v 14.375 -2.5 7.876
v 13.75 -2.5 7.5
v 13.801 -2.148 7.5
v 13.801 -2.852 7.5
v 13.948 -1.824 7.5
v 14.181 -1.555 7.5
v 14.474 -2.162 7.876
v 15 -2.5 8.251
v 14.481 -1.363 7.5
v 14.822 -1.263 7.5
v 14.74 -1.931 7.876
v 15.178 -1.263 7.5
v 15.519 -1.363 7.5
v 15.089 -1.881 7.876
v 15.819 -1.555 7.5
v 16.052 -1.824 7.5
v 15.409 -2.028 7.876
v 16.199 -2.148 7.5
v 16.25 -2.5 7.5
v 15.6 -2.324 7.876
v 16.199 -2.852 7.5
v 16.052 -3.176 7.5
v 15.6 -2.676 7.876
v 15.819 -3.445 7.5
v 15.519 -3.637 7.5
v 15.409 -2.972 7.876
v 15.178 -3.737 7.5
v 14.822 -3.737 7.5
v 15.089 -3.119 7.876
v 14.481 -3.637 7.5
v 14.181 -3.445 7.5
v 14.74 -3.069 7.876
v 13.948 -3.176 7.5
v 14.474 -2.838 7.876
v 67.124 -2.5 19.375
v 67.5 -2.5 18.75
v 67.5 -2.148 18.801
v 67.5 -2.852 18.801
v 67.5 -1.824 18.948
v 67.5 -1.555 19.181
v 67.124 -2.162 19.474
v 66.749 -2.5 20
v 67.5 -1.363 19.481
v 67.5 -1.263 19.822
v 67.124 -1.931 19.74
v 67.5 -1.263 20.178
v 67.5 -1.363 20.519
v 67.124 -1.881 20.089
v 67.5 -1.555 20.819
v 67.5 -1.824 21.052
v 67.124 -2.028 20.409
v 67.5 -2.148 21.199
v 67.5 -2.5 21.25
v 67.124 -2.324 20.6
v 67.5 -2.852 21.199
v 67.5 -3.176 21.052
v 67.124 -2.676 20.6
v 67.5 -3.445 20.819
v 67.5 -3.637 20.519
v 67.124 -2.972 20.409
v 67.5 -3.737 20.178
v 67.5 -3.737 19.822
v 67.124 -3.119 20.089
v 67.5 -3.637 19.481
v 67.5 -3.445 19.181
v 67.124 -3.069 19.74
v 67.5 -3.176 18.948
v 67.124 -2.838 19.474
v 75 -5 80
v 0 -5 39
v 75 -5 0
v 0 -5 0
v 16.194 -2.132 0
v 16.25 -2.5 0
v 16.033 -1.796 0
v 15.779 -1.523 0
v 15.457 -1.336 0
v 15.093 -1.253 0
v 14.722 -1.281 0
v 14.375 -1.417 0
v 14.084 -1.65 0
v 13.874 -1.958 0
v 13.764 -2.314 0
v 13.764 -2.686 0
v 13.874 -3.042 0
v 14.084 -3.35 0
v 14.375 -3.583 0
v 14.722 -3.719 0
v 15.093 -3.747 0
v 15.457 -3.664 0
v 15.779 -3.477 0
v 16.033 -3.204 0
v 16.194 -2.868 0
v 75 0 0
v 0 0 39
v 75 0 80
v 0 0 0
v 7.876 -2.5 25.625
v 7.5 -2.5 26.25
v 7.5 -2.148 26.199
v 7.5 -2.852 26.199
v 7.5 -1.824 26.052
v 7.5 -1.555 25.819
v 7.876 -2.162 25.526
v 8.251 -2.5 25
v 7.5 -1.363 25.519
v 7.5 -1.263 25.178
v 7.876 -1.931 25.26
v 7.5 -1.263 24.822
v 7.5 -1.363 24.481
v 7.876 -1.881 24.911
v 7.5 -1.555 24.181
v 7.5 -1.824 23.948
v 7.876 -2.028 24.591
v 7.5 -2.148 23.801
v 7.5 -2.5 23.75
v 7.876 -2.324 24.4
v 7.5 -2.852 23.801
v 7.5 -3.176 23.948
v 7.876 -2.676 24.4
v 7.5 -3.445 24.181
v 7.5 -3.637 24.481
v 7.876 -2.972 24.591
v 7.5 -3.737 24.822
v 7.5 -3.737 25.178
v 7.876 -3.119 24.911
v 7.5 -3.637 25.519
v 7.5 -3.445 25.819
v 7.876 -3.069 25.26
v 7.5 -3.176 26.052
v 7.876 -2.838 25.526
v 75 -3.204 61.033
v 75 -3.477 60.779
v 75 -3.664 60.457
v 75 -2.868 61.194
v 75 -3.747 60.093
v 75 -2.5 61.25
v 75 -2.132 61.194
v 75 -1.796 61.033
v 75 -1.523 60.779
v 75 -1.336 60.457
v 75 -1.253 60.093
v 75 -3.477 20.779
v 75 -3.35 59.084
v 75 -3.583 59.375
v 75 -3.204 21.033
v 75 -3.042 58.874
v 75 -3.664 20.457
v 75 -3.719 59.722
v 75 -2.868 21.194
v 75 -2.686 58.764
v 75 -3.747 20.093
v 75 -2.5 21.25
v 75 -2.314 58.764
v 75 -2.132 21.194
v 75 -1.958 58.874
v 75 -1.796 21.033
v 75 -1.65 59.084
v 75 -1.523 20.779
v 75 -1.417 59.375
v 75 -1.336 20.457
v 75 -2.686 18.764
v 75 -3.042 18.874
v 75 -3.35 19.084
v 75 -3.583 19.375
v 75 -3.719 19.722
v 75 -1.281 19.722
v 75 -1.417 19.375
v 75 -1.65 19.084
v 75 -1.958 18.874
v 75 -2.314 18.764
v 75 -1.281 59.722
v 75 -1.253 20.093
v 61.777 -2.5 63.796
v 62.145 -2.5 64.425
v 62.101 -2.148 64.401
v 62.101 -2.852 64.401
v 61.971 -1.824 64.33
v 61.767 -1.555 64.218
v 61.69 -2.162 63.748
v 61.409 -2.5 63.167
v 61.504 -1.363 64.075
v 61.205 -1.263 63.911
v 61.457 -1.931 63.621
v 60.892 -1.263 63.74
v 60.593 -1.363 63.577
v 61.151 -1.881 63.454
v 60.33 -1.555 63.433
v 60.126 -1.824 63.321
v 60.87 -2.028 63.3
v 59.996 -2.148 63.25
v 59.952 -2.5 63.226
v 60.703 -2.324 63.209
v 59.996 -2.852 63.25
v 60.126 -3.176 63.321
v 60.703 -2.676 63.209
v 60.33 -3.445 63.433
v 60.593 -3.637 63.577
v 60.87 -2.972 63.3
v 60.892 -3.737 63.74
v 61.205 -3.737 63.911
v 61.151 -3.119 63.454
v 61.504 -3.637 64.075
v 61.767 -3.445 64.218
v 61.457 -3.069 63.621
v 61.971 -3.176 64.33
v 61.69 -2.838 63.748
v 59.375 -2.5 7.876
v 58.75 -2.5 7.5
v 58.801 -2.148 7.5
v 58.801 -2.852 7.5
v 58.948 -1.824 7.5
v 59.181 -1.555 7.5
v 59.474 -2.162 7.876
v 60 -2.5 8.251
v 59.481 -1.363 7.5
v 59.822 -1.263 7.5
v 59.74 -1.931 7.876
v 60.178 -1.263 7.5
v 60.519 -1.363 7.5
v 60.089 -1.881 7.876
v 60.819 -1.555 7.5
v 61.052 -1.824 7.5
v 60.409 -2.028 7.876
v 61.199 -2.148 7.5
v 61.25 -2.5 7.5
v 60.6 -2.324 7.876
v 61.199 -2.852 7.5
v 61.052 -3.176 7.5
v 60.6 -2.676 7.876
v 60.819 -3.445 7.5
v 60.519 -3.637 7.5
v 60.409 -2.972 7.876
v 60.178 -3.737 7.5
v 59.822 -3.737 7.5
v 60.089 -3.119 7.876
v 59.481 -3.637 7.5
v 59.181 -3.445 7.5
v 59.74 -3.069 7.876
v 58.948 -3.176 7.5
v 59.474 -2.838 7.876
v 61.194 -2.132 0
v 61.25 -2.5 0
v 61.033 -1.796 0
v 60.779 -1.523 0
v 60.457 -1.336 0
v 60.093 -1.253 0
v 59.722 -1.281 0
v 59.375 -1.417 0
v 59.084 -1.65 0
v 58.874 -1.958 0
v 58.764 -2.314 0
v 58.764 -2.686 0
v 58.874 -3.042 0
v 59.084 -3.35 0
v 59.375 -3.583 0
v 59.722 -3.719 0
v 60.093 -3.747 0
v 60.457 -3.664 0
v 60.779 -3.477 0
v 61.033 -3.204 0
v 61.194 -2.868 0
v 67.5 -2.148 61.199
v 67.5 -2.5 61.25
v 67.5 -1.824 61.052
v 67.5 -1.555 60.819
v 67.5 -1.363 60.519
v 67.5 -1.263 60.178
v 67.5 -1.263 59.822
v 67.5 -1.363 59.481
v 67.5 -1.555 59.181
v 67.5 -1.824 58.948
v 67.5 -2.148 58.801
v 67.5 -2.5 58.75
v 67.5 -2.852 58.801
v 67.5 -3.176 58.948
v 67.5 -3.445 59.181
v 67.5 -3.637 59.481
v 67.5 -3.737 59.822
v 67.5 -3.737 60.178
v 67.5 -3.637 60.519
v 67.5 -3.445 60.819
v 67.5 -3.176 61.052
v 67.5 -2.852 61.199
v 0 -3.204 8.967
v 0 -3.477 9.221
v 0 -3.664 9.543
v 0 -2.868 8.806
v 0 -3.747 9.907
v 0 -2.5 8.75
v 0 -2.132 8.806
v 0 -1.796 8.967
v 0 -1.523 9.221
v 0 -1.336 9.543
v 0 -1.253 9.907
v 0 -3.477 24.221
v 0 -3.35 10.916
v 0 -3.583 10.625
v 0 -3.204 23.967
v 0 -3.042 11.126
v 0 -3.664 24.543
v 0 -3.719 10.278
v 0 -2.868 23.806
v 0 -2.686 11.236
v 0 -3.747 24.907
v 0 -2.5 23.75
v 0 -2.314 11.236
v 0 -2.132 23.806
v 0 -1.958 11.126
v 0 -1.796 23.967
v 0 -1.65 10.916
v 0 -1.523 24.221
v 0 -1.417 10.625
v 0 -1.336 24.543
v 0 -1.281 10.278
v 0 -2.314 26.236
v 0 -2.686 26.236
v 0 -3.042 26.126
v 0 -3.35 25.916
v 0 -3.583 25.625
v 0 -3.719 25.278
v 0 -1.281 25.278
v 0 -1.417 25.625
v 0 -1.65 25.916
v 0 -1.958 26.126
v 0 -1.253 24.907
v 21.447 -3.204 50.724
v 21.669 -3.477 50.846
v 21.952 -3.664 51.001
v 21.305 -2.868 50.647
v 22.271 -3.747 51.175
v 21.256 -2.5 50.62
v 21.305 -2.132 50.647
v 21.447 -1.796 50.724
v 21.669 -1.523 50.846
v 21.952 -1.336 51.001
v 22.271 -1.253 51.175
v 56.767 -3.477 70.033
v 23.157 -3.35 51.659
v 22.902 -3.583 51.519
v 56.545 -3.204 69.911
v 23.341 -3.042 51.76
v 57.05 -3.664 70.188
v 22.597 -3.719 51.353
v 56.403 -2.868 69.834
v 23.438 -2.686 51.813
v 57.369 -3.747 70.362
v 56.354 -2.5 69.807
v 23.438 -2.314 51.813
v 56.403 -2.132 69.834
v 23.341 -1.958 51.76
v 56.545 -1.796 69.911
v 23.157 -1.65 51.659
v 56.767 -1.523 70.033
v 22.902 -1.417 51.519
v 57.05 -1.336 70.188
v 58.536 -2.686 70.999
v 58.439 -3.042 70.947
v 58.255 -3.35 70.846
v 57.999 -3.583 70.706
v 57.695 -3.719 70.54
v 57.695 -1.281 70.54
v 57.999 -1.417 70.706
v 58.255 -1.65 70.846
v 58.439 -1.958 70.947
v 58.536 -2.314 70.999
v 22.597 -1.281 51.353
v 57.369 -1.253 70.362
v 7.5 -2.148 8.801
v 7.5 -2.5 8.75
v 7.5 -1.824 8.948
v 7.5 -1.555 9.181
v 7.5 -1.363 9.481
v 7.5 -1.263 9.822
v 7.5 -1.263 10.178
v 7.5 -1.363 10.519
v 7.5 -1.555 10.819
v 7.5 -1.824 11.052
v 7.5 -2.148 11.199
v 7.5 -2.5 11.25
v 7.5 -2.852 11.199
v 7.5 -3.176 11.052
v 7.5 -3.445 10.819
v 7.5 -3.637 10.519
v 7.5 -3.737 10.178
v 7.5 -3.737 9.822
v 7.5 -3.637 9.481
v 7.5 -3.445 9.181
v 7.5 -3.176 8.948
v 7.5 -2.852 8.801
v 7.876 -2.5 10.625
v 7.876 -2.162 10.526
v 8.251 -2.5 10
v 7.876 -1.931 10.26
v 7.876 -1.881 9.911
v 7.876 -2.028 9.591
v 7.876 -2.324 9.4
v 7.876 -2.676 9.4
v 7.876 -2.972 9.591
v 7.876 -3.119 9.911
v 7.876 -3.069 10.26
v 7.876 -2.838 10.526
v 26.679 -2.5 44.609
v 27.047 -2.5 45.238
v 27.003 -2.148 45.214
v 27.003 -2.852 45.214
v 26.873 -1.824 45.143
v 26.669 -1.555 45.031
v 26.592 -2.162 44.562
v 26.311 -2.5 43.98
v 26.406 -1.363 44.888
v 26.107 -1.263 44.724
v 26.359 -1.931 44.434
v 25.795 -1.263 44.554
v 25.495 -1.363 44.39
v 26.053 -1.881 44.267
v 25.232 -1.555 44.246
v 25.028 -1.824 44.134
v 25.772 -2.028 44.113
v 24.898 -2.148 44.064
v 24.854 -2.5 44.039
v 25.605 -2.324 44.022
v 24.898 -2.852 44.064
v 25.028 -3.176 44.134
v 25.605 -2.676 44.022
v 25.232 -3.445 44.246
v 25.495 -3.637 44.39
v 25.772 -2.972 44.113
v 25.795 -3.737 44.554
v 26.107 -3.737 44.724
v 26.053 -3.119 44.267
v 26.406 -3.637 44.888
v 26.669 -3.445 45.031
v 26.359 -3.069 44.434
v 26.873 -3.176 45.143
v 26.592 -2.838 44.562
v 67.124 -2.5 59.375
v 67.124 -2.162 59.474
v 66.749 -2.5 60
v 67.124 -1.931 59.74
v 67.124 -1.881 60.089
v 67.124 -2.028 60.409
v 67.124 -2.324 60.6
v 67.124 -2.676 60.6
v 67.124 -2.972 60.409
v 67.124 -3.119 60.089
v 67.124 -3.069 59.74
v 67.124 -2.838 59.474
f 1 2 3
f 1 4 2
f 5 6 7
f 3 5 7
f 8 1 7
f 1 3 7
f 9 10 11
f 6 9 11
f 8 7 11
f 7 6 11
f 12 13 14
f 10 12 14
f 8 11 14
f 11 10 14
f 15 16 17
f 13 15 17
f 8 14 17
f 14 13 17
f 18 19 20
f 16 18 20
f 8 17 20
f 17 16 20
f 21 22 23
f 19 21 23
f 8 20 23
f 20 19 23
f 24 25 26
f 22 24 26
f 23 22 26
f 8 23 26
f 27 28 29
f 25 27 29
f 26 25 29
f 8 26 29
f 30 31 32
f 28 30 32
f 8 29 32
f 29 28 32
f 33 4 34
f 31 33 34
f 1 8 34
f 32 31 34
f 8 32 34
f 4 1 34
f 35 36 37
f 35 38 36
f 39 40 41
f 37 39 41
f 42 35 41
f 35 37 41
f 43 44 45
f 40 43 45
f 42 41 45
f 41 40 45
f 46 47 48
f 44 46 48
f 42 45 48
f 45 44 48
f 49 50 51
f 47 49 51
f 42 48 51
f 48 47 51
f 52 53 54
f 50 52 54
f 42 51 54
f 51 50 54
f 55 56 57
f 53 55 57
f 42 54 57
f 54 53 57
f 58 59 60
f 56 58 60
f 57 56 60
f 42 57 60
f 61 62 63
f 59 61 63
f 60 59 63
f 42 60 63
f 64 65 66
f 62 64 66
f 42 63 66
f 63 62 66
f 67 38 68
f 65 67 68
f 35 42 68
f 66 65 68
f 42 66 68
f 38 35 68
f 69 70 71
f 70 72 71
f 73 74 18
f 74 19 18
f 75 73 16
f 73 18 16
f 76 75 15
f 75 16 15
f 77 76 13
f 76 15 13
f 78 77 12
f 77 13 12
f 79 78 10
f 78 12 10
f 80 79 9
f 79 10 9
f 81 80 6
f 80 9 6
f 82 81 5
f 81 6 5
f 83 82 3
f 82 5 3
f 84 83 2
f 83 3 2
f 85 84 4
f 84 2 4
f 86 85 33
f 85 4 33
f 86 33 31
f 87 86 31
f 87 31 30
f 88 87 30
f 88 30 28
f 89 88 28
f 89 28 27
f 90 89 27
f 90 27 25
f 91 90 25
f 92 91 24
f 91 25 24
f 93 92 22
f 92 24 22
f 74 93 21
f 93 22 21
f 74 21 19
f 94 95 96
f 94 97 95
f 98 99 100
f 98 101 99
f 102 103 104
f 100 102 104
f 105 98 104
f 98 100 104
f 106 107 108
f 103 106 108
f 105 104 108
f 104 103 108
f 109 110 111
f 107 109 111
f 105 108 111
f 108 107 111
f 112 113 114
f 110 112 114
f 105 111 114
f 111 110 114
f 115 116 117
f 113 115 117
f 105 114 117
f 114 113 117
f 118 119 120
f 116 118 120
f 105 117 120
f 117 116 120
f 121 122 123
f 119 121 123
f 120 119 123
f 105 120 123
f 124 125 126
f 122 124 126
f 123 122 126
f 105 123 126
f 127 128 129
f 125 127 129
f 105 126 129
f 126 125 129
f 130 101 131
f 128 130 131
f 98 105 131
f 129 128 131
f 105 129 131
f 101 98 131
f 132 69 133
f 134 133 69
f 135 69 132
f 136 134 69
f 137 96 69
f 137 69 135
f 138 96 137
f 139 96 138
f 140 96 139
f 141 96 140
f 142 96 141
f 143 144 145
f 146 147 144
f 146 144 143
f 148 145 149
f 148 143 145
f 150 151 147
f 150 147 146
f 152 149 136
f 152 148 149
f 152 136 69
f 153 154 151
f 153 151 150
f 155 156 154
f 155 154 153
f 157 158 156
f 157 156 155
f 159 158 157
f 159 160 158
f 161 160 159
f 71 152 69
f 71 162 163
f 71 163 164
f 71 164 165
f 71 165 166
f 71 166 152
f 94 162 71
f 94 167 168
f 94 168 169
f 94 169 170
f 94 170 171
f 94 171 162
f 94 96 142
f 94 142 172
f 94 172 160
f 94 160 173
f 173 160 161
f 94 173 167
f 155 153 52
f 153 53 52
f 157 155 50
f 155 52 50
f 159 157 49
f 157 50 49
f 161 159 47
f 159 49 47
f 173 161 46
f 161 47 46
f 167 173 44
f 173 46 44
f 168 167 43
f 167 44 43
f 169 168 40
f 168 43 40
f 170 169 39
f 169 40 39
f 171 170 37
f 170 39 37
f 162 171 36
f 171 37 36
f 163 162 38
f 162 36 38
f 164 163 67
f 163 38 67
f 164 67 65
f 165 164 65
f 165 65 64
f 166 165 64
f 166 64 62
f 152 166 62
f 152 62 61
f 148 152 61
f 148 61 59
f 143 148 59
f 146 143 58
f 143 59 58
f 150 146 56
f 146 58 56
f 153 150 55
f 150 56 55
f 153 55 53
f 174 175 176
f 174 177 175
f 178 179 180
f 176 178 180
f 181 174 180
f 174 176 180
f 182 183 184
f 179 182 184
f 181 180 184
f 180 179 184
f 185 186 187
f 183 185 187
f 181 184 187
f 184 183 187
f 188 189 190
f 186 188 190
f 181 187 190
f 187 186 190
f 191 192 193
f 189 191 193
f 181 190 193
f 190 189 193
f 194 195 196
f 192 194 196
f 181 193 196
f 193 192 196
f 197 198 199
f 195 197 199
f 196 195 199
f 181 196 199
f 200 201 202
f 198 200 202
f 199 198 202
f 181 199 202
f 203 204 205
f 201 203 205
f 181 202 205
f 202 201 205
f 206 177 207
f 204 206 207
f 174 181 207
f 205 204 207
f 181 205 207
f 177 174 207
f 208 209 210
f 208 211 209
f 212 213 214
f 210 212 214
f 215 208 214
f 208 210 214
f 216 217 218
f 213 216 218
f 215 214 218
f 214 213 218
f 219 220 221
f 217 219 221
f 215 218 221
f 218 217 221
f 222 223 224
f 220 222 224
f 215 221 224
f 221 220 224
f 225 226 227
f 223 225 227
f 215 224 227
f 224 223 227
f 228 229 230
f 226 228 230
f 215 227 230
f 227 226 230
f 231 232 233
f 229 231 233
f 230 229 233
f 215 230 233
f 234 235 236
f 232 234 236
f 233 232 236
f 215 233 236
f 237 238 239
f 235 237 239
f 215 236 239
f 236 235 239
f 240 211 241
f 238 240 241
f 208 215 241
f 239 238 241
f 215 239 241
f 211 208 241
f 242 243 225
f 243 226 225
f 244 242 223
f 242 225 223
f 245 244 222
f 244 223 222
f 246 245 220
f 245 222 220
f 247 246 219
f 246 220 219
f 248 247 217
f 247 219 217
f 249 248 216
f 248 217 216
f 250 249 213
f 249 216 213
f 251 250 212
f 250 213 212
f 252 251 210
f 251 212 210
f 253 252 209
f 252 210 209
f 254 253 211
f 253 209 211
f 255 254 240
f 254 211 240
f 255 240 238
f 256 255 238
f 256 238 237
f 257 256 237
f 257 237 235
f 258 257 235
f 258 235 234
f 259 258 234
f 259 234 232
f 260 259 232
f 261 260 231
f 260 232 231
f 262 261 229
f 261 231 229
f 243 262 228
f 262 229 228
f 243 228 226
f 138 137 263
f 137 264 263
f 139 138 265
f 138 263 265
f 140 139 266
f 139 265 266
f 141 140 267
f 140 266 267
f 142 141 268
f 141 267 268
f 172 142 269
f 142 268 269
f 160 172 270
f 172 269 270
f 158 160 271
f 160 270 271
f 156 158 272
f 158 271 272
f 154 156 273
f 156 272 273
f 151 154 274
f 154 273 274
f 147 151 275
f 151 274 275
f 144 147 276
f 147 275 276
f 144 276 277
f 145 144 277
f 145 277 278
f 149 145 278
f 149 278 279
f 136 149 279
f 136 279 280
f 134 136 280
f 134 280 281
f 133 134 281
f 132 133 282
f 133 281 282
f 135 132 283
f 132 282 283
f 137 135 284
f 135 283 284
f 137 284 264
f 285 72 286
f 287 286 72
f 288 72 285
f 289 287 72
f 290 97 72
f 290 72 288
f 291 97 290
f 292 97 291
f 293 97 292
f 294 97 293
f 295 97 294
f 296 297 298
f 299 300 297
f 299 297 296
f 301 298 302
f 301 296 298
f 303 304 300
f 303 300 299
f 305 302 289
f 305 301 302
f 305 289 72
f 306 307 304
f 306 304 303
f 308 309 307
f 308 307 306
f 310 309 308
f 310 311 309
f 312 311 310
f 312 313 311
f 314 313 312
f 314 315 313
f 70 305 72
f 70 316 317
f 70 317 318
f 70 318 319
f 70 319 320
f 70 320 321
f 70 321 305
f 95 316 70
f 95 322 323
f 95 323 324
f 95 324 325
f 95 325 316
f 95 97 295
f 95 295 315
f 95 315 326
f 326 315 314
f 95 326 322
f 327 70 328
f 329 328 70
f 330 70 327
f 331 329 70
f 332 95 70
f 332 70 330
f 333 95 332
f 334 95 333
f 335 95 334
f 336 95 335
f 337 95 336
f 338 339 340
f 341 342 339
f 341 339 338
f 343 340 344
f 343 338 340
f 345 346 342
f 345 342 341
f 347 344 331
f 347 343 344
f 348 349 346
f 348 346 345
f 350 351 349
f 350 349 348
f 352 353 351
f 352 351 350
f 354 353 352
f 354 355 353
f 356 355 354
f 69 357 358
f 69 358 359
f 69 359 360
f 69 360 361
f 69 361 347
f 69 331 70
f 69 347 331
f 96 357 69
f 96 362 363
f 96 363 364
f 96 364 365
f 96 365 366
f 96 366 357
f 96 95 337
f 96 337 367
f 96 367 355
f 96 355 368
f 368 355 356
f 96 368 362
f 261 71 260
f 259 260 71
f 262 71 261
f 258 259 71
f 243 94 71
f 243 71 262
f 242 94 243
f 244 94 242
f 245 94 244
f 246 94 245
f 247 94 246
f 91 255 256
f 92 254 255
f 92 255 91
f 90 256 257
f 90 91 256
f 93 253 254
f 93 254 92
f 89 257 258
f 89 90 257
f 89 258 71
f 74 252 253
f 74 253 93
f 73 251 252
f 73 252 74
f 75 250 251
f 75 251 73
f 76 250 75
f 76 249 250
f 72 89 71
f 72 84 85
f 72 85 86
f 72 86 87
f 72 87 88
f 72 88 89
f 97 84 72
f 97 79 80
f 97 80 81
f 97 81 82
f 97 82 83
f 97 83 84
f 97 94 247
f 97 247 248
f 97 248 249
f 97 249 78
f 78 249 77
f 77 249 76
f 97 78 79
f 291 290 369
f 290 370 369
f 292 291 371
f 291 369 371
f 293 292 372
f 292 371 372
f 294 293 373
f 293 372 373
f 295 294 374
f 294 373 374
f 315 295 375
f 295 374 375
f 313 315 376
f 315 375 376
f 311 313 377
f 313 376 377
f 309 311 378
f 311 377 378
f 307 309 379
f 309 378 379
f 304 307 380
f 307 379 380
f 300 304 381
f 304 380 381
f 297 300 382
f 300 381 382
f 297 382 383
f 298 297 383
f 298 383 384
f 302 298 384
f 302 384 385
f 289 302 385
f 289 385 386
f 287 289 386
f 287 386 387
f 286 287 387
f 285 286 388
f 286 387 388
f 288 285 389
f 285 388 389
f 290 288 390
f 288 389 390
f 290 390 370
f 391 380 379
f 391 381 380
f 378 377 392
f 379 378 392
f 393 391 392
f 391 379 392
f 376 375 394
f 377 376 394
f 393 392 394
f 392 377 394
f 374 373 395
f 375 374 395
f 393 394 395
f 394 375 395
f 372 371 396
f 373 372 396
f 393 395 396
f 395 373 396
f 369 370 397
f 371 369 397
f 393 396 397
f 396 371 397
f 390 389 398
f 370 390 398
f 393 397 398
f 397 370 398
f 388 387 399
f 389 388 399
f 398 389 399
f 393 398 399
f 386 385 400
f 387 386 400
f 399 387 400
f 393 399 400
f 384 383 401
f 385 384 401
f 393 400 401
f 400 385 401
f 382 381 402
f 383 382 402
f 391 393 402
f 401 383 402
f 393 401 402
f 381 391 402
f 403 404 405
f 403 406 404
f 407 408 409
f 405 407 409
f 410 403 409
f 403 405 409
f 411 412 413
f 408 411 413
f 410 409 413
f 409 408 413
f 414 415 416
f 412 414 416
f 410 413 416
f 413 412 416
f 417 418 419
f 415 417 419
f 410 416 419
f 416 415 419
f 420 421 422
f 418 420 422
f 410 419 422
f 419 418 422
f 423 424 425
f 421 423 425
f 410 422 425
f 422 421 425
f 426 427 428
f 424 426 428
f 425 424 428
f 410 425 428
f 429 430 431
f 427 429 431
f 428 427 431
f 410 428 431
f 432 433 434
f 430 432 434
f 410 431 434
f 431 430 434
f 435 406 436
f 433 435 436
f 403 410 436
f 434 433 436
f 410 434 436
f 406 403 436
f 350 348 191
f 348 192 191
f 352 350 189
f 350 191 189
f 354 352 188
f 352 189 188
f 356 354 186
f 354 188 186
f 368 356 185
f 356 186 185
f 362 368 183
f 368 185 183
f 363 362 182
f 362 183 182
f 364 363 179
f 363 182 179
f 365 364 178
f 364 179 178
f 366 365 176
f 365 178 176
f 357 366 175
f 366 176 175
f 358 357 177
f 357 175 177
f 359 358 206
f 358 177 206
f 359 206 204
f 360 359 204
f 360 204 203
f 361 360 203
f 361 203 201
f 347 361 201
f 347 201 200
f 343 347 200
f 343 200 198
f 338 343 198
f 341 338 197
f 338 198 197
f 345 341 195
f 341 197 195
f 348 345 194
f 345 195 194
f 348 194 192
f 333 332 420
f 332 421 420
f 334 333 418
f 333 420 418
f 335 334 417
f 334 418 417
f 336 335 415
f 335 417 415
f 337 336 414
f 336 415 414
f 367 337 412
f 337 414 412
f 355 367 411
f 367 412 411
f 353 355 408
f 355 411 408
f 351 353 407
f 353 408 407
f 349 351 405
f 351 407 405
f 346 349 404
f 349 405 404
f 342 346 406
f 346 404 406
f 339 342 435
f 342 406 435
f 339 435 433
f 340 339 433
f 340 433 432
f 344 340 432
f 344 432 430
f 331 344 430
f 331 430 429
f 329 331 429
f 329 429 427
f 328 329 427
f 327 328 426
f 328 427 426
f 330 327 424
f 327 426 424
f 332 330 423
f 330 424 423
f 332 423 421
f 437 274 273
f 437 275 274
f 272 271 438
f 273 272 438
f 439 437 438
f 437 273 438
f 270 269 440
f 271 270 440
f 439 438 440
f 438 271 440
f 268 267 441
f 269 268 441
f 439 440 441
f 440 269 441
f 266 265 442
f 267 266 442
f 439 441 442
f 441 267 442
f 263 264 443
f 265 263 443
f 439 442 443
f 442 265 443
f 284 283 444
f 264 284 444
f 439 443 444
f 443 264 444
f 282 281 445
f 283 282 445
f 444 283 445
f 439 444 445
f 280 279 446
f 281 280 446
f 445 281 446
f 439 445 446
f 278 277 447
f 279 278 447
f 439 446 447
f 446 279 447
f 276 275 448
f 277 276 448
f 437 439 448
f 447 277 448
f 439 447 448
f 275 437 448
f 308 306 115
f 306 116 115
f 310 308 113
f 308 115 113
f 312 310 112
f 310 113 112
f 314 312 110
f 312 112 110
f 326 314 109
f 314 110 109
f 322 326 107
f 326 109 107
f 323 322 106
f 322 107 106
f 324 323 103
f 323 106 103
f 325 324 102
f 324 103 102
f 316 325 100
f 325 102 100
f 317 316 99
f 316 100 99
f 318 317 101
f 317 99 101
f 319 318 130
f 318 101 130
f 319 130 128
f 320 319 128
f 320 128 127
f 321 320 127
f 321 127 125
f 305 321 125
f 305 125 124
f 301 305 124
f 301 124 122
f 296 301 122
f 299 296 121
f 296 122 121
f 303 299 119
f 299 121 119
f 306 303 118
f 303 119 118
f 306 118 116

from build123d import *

# Parameters (mm, degrees)
BOSS_EXTRUDE1_DEPTH       = 5
M3X0_5_TAPPED_HOLE1_D     = 2.5
M3X0_5_TAPPED_HOLE1_DEPTH = 7.5
M3X0_5_TAPPED_HOLE1_TIP   = 0.751075774
M3X0_5_TAPPED_HOLE2_D     = 2.5
M3X0_5_TAPPED_HOLE2_DEPTH = 7.5
M3X0_5_TAPPED_HOLE2_TIP   = 0.751075774
M3X0_5_TAPPED_HOLE3_D     = 2.5
M3X0_5_TAPPED_HOLE3_DEPTH = 7.5
M3X0_5_TAPPED_HOLE3_TIP   = 0.751075774
M3X0_5_TAPPED_HOLE4_D     = 2.5
M3X0_5_TAPPED_HOLE4_DEPTH = 7.5
M3X0_5_TAPPED_HOLE4_TIP   = 0.751075774


with BuildPart() as part:
    # Sketch1 → Boss-Extrude1 (new body)
    with BuildSketch(Plane(origin=(0, 0, 0), x_dir=(1, 0, 0), z_dir=(0, 1, 0))):
        Polygon((0, -39), (75, -80), (75, 0), (0, 0), align=None)
    extrude(amount=-BOSS_EXTRUDE1_DEPTH)

    # M3x0.5 Tapped Hole1
    with Locations(Plane(origin=(0, 0, 0), x_dir=(-1, 0, 0), z_dir=(0, 0, -1))):
        with Locations((-15, -2.5), (-60, -2.5)):
            Hole(M3X0_5_TAPPED_HOLE1_D / 2, depth=M3X0_5_TAPPED_HOLE1_DEPTH)
            with Locations((0, 0, -(M3X0_5_TAPPED_HOLE1_DEPTH + M3X0_5_TAPPED_HOLE1_TIP / 2))):  # 118° drill point
                Cone(0, M3X0_5_TAPPED_HOLE1_D / 2, M3X0_5_TAPPED_HOLE1_TIP, mode=Mode.SUBTRACT)

    # M3x0.5 Tapped Hole2
    with Locations(Plane.ZY):
        with Locations((10, -2.5), (25, -2.5)):
            Hole(M3X0_5_TAPPED_HOLE2_D / 2, depth=M3X0_5_TAPPED_HOLE2_DEPTH)
            with Locations((0, 0, -(M3X0_5_TAPPED_HOLE2_DEPTH + M3X0_5_TAPPED_HOLE2_TIP / 2))):  # 118° drill point
                Cone(0, M3X0_5_TAPPED_HOLE2_D / 2, M3X0_5_TAPPED_HOLE2_TIP, mode=Mode.SUBTRACT)

    # M3x0.5 Tapped Hole3
    with Locations(Plane(origin=(75, 0, 0), x_dir=(0, 0, -1), z_dir=(1, 0, 0))):
        with Locations((-20, -2.5), (-60, -2.5)):
            Hole(M3X0_5_TAPPED_HOLE3_D / 2, depth=M3X0_5_TAPPED_HOLE3_DEPTH)
            with Locations((0, 0, -(M3X0_5_TAPPED_HOLE3_DEPTH + M3X0_5_TAPPED_HOLE3_TIP / 2))):  # 118° drill point
                Cone(0, M3X0_5_TAPPED_HOLE3_D / 2, M3X0_5_TAPPED_HOLE3_TIP, mode=Mode.SUBTRACT)

    # M3x0.5 Tapped Hole4
    with Locations(Plane(origin=(-16.414590747, 0, 30.026690391), x_dir=(0.8774480829328538, 0, 0.4796716186699602), z_dir=(-0.4796716186699602, 0, 0.8774480829328538))):
        with Locations((44.182335714, -2.5), (84.182335714, -2.5)):
            Hole(M3X0_5_TAPPED_HOLE4_D / 2, depth=M3X0_5_TAPPED_HOLE4_DEPTH)
            with Locations((0, 0, -(M3X0_5_TAPPED_HOLE4_DEPTH + M3X0_5_TAPPED_HOLE4_TIP / 2))):  # 118° drill point
                Cone(0, M3X0_5_TAPPED_HOLE4_D / 2, M3X0_5_TAPPED_HOLE4_TIP, mode=Mode.SUBTRACT)


solid = part.part
